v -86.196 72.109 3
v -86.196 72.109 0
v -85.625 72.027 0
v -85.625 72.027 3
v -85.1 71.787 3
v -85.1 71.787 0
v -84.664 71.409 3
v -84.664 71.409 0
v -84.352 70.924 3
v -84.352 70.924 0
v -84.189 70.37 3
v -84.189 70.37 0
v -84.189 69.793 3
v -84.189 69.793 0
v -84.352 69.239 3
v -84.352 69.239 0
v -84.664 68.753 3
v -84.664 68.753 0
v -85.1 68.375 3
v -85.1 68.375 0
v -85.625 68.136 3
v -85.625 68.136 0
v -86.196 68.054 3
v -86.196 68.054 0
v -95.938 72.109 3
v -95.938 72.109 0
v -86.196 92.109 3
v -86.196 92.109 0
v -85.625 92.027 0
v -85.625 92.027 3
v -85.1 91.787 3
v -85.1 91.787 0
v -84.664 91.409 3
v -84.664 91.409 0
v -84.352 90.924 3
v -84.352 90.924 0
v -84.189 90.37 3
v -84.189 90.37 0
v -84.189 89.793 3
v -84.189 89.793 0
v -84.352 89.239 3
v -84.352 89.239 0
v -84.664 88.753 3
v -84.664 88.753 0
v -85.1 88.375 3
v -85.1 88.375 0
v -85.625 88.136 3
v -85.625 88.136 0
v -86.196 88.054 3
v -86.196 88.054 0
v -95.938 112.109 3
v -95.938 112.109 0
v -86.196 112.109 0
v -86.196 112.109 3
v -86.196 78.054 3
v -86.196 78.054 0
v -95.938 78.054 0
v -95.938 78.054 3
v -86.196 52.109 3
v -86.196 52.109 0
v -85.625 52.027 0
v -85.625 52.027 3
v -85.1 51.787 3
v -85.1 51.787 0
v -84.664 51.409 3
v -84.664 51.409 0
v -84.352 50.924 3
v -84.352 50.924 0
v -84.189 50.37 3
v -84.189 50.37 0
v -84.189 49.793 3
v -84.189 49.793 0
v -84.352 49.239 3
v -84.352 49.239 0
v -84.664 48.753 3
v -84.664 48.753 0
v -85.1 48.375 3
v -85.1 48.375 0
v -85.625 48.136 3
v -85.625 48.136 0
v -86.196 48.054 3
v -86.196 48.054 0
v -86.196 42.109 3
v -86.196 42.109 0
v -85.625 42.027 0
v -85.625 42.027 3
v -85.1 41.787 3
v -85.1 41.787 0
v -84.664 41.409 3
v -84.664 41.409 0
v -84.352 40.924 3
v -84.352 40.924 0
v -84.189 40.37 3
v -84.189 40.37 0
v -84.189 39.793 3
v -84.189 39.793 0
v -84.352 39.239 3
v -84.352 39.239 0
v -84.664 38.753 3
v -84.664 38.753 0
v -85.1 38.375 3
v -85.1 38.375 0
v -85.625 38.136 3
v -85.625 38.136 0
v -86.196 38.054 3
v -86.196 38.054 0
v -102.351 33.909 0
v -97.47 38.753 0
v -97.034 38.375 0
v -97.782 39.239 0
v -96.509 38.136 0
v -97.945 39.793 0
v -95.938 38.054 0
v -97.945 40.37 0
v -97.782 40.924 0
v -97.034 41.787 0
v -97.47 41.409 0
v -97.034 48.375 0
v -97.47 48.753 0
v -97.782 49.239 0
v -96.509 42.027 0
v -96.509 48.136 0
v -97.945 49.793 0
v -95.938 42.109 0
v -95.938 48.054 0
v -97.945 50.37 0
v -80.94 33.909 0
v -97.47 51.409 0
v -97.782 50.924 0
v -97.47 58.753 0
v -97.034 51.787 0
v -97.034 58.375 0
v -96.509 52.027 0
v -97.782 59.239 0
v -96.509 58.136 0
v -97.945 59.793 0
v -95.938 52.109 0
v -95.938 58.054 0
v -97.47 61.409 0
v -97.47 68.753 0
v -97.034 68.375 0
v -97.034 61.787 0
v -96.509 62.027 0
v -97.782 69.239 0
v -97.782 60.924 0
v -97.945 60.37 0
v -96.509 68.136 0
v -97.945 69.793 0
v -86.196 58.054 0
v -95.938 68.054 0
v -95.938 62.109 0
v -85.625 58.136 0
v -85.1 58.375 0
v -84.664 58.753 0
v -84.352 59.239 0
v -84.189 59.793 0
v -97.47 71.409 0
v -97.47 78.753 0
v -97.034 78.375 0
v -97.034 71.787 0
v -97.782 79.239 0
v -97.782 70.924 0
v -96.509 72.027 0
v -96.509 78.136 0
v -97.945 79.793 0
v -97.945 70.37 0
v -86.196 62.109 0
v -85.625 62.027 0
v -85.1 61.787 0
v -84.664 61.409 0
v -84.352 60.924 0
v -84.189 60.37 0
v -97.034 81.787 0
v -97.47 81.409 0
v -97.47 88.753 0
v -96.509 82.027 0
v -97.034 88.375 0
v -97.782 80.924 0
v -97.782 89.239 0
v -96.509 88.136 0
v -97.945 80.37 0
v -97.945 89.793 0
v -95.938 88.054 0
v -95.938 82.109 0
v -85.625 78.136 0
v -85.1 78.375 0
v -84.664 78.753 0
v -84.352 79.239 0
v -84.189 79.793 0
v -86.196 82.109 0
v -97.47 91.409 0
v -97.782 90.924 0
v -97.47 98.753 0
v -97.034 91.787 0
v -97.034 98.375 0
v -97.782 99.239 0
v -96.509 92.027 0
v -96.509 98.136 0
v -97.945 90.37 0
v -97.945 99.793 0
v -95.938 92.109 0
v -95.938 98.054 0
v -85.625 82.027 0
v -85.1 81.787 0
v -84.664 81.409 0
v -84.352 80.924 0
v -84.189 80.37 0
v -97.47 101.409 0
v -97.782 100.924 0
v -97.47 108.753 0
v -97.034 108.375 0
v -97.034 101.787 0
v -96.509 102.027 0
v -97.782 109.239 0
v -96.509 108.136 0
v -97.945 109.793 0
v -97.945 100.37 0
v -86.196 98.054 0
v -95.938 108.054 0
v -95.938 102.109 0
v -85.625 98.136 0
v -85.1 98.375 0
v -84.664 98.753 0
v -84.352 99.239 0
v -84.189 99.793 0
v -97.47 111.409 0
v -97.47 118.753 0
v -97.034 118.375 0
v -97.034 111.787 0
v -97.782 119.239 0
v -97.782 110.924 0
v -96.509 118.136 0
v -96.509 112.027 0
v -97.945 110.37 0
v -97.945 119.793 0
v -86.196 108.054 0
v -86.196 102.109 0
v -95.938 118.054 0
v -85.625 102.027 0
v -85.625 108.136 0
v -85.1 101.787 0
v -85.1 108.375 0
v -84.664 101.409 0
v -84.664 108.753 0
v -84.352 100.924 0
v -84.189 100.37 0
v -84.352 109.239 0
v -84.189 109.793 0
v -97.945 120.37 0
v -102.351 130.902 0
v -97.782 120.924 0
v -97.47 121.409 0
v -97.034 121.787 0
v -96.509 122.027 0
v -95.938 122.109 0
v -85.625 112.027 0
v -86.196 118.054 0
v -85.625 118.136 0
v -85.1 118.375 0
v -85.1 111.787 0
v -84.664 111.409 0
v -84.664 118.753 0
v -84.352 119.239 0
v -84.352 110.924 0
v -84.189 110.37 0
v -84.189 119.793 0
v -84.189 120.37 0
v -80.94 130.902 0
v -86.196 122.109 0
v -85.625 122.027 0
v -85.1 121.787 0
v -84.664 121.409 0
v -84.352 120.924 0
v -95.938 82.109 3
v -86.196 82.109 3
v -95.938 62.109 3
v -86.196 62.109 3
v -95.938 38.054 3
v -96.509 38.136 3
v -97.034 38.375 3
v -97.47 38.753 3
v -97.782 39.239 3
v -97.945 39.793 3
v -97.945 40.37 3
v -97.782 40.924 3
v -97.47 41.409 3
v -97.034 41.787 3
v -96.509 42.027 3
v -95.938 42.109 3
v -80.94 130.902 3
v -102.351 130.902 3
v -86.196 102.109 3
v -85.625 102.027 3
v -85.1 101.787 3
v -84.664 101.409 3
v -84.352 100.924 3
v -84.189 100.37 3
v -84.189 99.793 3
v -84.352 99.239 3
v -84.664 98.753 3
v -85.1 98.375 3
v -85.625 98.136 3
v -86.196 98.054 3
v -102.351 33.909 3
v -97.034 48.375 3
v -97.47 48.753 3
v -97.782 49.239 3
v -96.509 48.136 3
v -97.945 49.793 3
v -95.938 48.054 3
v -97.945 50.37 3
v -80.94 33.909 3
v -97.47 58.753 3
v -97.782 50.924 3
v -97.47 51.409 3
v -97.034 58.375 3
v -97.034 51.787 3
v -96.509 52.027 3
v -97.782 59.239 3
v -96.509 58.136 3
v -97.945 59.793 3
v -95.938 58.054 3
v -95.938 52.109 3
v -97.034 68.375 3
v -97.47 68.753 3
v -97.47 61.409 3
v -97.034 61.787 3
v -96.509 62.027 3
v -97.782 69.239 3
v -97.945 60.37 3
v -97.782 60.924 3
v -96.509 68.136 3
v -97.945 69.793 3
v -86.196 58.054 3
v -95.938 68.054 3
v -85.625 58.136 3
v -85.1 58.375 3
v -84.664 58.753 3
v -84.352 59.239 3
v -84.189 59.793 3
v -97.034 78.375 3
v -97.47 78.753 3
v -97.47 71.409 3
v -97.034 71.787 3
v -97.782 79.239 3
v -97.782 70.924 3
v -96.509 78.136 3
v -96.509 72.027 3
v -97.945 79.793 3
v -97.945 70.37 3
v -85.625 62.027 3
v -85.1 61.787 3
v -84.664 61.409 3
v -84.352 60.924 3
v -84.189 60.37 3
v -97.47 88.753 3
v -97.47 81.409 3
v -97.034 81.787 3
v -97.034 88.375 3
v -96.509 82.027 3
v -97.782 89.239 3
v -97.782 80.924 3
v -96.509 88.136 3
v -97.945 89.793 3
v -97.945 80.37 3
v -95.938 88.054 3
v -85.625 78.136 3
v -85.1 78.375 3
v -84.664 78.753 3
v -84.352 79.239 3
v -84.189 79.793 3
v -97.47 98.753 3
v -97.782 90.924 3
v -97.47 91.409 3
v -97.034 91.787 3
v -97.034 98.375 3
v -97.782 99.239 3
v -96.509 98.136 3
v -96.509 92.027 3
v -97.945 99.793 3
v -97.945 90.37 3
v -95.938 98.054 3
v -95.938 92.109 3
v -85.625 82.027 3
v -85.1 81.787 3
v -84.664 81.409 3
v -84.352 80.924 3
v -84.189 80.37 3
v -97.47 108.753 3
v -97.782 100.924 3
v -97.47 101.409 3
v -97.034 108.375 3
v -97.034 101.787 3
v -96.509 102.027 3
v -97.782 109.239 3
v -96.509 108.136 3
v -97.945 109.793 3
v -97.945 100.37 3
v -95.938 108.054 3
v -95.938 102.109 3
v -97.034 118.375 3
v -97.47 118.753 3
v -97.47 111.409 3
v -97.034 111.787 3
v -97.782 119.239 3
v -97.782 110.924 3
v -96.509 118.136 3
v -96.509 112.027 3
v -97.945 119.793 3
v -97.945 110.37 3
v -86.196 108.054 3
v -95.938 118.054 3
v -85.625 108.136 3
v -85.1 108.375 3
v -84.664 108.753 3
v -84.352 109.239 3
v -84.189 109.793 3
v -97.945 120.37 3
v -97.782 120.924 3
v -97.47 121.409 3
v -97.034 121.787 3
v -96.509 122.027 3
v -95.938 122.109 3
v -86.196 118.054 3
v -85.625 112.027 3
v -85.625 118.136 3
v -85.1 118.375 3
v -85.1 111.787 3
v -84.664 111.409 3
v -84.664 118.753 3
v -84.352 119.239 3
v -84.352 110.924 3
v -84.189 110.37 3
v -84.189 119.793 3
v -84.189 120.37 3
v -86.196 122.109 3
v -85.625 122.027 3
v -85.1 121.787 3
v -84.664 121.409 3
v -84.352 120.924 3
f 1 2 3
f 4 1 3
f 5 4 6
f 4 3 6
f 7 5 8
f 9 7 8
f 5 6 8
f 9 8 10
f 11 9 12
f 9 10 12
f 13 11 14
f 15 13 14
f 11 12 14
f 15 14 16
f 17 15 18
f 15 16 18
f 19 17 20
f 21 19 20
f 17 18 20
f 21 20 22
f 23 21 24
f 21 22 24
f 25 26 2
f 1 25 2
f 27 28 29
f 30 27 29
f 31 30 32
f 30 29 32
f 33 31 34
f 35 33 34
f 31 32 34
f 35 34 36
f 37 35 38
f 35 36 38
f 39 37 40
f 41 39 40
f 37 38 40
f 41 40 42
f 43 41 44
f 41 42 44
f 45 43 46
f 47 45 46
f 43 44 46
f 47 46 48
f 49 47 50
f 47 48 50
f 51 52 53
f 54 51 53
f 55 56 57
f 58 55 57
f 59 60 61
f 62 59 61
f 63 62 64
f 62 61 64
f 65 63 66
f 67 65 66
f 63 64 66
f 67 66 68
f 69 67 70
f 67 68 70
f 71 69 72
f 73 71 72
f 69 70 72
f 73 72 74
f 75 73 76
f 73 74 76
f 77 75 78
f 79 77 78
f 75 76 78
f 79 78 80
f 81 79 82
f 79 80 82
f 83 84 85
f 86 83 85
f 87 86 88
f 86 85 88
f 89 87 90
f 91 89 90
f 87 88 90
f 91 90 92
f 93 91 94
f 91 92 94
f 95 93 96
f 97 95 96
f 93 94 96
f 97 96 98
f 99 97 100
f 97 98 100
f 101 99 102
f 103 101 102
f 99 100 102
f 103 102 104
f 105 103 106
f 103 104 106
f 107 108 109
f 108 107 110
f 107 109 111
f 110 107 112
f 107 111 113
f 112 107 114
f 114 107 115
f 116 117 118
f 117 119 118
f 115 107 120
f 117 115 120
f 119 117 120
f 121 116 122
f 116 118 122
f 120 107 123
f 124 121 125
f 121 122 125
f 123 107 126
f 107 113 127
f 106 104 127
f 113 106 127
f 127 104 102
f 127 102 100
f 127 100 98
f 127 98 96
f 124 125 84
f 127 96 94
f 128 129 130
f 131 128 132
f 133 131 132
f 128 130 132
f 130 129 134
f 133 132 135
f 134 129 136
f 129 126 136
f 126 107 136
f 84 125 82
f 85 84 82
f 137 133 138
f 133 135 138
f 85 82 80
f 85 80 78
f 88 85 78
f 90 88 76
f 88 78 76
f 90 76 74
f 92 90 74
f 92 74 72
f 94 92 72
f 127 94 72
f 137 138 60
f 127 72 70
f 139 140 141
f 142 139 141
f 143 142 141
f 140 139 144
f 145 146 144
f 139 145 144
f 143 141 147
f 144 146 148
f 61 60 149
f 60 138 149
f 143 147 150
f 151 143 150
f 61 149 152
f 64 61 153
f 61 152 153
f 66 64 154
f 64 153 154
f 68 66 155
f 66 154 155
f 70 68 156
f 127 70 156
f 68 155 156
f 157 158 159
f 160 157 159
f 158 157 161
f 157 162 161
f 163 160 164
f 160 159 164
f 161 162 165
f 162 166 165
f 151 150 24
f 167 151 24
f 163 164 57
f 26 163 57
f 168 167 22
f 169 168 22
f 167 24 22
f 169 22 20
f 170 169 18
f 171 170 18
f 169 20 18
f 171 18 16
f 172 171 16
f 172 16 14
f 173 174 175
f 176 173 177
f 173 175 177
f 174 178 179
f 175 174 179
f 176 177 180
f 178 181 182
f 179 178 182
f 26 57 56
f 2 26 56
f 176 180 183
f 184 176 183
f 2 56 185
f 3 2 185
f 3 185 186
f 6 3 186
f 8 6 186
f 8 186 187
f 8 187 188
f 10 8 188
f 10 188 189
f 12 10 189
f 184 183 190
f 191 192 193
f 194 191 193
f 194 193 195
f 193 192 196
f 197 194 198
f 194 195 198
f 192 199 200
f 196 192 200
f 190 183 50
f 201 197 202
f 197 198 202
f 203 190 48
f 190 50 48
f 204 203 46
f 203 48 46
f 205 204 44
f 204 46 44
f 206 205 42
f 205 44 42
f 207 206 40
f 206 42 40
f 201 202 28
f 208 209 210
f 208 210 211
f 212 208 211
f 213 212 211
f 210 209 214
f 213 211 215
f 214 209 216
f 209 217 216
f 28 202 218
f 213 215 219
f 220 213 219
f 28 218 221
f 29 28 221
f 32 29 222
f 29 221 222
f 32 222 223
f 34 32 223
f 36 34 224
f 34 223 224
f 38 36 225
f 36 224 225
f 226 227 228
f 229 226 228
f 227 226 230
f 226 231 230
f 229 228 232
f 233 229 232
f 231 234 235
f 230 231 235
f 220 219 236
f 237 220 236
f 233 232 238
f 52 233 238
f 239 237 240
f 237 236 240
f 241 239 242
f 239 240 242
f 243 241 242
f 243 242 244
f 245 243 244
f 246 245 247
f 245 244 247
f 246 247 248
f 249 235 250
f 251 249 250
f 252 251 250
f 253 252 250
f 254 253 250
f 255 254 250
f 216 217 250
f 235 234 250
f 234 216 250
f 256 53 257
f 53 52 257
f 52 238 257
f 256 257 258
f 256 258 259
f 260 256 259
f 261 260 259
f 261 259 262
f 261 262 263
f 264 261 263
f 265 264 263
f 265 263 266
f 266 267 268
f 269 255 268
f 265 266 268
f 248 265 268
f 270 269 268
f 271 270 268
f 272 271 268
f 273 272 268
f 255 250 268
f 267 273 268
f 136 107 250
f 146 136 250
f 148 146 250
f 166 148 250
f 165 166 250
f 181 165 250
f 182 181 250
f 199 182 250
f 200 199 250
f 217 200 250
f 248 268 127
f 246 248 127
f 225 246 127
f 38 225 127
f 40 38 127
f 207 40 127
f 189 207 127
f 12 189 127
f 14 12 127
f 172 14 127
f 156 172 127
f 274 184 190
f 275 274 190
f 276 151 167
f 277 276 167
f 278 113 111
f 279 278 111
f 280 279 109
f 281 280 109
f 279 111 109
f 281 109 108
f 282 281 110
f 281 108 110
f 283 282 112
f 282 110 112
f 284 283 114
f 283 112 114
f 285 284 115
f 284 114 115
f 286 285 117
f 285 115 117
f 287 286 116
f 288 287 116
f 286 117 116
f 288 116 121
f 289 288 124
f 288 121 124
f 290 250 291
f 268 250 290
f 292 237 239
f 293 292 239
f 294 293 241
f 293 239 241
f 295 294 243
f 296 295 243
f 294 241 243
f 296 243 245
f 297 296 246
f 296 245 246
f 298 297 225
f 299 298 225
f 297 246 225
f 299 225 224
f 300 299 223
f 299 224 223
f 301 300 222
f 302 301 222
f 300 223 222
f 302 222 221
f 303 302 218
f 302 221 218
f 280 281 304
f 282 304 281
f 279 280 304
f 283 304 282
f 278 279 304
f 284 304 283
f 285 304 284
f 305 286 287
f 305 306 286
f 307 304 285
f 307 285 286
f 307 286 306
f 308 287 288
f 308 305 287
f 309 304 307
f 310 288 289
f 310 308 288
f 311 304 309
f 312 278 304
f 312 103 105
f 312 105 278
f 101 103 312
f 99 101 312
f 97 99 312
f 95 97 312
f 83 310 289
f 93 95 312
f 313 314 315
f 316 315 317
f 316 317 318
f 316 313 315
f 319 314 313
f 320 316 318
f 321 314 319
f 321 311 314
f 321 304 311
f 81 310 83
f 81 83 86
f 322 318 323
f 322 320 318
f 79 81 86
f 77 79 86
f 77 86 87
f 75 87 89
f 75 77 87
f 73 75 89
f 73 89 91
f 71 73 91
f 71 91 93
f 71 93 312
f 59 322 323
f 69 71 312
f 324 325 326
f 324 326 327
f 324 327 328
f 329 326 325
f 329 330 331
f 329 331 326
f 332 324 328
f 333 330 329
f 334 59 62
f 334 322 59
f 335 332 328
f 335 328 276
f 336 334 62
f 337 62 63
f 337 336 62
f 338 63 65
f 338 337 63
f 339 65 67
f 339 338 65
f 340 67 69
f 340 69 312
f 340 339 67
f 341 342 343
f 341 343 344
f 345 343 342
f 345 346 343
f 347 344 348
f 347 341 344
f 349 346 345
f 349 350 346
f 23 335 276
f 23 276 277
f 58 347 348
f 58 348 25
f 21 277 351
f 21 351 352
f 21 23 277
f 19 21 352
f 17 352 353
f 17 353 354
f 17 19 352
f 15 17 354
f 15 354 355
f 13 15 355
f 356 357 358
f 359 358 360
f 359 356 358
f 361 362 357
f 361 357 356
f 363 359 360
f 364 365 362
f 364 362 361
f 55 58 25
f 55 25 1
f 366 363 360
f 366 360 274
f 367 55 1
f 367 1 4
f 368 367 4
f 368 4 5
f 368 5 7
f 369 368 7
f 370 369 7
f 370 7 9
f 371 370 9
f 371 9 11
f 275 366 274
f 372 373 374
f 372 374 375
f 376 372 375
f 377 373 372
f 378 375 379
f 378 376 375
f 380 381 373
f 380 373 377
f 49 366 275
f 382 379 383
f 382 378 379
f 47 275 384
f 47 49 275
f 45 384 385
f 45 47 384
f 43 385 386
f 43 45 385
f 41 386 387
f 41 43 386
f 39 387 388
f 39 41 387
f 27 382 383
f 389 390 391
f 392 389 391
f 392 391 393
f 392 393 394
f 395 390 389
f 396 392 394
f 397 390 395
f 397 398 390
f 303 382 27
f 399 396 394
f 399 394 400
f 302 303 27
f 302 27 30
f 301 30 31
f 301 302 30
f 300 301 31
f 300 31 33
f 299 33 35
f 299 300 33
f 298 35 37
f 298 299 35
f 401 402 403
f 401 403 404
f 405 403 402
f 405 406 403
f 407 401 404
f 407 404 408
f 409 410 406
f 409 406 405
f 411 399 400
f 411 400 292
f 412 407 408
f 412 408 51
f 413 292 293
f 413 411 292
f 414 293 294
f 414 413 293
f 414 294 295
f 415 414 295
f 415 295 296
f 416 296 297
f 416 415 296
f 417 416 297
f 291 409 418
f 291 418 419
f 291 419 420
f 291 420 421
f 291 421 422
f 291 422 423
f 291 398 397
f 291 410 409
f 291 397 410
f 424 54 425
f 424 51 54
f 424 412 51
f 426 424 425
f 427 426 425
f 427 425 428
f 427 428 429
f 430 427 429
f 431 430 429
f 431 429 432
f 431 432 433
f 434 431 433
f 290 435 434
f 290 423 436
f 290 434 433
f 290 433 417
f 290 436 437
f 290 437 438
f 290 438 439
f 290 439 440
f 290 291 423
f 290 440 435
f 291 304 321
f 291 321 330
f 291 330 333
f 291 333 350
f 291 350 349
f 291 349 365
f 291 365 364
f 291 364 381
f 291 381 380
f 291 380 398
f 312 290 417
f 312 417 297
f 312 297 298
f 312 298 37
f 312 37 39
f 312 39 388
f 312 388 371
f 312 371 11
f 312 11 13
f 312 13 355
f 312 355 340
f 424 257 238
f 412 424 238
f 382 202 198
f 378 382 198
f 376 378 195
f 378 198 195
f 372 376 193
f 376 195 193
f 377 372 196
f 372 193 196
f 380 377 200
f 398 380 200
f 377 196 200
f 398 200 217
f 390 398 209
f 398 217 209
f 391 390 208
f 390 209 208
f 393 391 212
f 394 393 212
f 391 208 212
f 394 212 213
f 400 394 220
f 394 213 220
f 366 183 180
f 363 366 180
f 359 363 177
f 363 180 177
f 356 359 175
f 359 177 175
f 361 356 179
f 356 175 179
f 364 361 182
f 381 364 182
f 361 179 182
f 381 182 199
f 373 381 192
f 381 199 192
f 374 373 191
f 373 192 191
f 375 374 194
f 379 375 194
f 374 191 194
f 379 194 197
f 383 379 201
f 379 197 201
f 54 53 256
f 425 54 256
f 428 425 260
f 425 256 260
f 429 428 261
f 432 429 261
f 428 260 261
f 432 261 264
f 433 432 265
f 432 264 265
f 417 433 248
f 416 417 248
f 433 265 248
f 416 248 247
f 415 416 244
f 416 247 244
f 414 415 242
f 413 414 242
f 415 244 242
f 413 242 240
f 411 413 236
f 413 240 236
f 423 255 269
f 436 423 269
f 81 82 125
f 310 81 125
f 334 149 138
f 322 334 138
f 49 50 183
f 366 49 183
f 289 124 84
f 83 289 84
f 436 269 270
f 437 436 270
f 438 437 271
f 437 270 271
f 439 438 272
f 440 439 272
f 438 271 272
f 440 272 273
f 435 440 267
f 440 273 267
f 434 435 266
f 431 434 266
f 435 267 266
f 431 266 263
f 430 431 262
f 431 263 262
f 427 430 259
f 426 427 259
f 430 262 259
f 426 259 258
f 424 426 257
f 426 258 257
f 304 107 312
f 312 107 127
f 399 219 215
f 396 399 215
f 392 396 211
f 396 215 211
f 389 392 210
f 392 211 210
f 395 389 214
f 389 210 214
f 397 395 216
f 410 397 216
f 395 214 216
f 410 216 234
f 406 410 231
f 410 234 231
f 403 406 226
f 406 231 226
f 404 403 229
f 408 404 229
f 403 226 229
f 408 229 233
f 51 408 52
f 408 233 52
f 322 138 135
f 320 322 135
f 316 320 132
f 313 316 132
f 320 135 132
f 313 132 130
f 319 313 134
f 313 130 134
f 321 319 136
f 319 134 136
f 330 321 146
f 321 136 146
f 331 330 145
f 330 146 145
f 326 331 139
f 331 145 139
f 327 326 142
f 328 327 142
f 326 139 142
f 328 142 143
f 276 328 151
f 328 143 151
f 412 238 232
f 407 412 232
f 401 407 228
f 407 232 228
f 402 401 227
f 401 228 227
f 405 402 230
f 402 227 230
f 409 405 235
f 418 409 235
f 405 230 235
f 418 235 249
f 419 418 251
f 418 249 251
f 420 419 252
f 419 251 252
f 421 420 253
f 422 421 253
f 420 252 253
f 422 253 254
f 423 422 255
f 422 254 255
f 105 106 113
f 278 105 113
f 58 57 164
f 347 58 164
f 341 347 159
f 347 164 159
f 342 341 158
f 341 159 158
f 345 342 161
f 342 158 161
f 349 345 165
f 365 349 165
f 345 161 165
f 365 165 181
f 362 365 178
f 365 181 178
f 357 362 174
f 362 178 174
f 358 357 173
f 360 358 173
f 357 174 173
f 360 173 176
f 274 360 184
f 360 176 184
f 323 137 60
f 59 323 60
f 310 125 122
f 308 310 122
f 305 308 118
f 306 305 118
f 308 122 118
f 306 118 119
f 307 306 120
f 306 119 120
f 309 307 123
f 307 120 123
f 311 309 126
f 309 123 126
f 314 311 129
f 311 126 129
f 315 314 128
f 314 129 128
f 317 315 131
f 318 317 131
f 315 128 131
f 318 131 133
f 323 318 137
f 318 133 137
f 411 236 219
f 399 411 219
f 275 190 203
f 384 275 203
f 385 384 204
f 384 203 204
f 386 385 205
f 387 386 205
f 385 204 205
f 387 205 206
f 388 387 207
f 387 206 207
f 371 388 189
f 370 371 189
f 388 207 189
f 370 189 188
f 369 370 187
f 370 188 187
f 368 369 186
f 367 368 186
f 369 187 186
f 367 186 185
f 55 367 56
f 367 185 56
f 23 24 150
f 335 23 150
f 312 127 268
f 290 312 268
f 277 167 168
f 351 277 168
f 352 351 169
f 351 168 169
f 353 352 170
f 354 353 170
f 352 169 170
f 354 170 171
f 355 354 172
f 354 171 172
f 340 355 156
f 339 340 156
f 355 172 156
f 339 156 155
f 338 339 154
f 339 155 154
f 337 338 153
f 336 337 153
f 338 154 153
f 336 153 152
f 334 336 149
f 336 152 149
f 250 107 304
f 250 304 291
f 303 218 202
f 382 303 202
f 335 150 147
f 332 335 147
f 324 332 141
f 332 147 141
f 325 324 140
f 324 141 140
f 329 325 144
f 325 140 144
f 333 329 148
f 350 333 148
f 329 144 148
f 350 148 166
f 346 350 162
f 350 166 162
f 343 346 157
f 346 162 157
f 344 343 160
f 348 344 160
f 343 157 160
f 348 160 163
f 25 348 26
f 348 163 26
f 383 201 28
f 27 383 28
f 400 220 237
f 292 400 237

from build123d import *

# Parameters (mm, degrees)
SKETCH1_W           = 21.411233639
SKETCH1_H           = 96.993593864
BOSS_EXTRUDE1_DEPTH = 3


with BuildPart() as part:
    # Sketch1 → Boss-Extrude1 (new body)
    with BuildSketch(Plane.XY):
        with Locations((-91.64577638, 82.405352126)):
            Rectangle(SKETCH1_W, SKETCH1_H)
        with BuildLine():
            Line((-86.19596438, 38.053580074), (-95.937669189, 38.053580074))
            ThreePointArc((-95.937669189, 38.053580074), (-97.965327886, 40.081238771), (-95.937669189, 42.108897468))
            Line((-95.937669189, 42.108897468), (-86.19596438, 42.108897468))
            ThreePointArc((-86.19596438, 42.108897468), (-84.168305683, 40.081238771), (-86.19596438, 38.053580074))
        make_face(mode=Mode.SUBTRACT)
        with BuildLine():
            Line((-86.19596438, 48.053580074), (-95.937669189, 48.053580074))
            ThreePointArc((-95.937669189, 48.053580074), (-97.965327886, 50.081238771), (-95.937669189, 52.108897468))
            Line((-95.937669189, 52.108897468), (-86.19596438, 52.108897468))
            ThreePointArc((-86.19596438, 52.108897468), (-84.168305683, 50.081238771), (-86.19596438, 48.053580074))
        make_face(mode=Mode.SUBTRACT)
        with BuildLine():
            Line((-86.19596438, 58.053580074), (-95.937669189, 58.053580074))
            ThreePointArc((-95.937669189, 58.053580074), (-97.965327886, 60.081238771), (-95.937669189, 62.108897468))
            Line((-95.937669189, 62.108897468), (-86.19596438, 62.108897468))
            ThreePointArc((-86.19596438, 62.108897468), (-84.168305683, 60.081238771), (-86.19596438, 58.053580074))
        make_face(mode=Mode.SUBTRACT)
        with BuildLine():
            Line((-86.19596438, 68.053580074), (-95.937669189, 68.053580074))
            ThreePointArc((-95.937669189, 68.053580074), (-97.965327886, 70.081238771), (-95.937669189, 72.108897468))
            Line((-95.937669189, 72.108897468), (-86.19596438, 72.108897468))
            ThreePointArc((-86.19596438, 72.108897468), (-84.168305683, 70.081238771), (-86.19596438, 68.053580074))
        make_face(mode=Mode.SUBTRACT)
        with BuildLine():
            Line((-86.19596438, 78.053580074), (-95.937669189, 78.053580074))
            ThreePointArc((-95.937669189, 78.053580074), (-97.965327886, 80.081238771), (-95.937669189, 82.108897468))
            Line((-95.937669189, 82.108897468), (-86.19596438, 82.108897468))
            ThreePointArc((-86.19596438, 82.108897468), (-84.168305683, 80.081238771), (-86.19596438, 78.053580074))
        make_face(mode=Mode.SUBTRACT)
        with BuildLine():
            Line((-86.19596438, 88.053580074), (-95.937669189, 88.053580074))
            ThreePointArc((-95.937669189, 88.053580074), (-97.965327886, 90.081238771), (-95.937669189, 92.108897468))
            Line((-95.937669189, 92.108897468), (-86.19596438, 92.108897468))
            ThreePointArc((-86.19596438, 92.108897468), (-84.168305683, 90.081238771), (-86.19596438, 88.053580074))
        make_face(mode=Mode.SUBTRACT)
        with BuildLine():
            Line((-86.19596438, 98.053580074), (-95.937669189, 98.053580074))
            ThreePointArc((-95.937669189, 98.053580074), (-97.965327886, 100.081238771), (-95.937669189, 102.108897468))
            Line((-95.937669189, 102.108897468), (-86.19596438, 102.108897468))
            ThreePointArc((-86.19596438, 102.108897468), (-84.168305683, 100.081238771), (-86.19596438, 98.053580074))
        make_face(mode=Mode.SUBTRACT)
        with BuildLine():
            Line((-86.19596438, 108.053580074), (-95.937669189, 108.053580074))
            ThreePointArc((-95.937669189, 108.053580074), (-97.965327886, 110.081238771), (-95.937669189, 112.108897468))
            Line((-95.937669189, 112.108897468), (-86.19596438, 112.108897468))
            ThreePointArc((-86.19596438, 112.108897468), (-84.168305683, 110.081238771), (-86.19596438, 108.053580074))
        make_face(mode=Mode.SUBTRACT)
        with BuildLine():
            Line((-86.19596438, 118.053580074), (-95.937669189, 118.053580074))
            ThreePointArc((-95.937669189, 118.053580074), (-97.965327886, 120.081238771), (-95.937669189, 122.108897468))
            Line((-95.937669189, 122.108897468), (-86.19596438, 122.108897468))
            ThreePointArc((-86.19596438, 122.108897468), (-84.168305683, 120.081238771), (-86.19596438, 118.053580074))
        make_face(mode=Mode.SUBTRACT)
    extrude(amount=BOSS_EXTRUDE1_DEPTH)


solid = part.part
